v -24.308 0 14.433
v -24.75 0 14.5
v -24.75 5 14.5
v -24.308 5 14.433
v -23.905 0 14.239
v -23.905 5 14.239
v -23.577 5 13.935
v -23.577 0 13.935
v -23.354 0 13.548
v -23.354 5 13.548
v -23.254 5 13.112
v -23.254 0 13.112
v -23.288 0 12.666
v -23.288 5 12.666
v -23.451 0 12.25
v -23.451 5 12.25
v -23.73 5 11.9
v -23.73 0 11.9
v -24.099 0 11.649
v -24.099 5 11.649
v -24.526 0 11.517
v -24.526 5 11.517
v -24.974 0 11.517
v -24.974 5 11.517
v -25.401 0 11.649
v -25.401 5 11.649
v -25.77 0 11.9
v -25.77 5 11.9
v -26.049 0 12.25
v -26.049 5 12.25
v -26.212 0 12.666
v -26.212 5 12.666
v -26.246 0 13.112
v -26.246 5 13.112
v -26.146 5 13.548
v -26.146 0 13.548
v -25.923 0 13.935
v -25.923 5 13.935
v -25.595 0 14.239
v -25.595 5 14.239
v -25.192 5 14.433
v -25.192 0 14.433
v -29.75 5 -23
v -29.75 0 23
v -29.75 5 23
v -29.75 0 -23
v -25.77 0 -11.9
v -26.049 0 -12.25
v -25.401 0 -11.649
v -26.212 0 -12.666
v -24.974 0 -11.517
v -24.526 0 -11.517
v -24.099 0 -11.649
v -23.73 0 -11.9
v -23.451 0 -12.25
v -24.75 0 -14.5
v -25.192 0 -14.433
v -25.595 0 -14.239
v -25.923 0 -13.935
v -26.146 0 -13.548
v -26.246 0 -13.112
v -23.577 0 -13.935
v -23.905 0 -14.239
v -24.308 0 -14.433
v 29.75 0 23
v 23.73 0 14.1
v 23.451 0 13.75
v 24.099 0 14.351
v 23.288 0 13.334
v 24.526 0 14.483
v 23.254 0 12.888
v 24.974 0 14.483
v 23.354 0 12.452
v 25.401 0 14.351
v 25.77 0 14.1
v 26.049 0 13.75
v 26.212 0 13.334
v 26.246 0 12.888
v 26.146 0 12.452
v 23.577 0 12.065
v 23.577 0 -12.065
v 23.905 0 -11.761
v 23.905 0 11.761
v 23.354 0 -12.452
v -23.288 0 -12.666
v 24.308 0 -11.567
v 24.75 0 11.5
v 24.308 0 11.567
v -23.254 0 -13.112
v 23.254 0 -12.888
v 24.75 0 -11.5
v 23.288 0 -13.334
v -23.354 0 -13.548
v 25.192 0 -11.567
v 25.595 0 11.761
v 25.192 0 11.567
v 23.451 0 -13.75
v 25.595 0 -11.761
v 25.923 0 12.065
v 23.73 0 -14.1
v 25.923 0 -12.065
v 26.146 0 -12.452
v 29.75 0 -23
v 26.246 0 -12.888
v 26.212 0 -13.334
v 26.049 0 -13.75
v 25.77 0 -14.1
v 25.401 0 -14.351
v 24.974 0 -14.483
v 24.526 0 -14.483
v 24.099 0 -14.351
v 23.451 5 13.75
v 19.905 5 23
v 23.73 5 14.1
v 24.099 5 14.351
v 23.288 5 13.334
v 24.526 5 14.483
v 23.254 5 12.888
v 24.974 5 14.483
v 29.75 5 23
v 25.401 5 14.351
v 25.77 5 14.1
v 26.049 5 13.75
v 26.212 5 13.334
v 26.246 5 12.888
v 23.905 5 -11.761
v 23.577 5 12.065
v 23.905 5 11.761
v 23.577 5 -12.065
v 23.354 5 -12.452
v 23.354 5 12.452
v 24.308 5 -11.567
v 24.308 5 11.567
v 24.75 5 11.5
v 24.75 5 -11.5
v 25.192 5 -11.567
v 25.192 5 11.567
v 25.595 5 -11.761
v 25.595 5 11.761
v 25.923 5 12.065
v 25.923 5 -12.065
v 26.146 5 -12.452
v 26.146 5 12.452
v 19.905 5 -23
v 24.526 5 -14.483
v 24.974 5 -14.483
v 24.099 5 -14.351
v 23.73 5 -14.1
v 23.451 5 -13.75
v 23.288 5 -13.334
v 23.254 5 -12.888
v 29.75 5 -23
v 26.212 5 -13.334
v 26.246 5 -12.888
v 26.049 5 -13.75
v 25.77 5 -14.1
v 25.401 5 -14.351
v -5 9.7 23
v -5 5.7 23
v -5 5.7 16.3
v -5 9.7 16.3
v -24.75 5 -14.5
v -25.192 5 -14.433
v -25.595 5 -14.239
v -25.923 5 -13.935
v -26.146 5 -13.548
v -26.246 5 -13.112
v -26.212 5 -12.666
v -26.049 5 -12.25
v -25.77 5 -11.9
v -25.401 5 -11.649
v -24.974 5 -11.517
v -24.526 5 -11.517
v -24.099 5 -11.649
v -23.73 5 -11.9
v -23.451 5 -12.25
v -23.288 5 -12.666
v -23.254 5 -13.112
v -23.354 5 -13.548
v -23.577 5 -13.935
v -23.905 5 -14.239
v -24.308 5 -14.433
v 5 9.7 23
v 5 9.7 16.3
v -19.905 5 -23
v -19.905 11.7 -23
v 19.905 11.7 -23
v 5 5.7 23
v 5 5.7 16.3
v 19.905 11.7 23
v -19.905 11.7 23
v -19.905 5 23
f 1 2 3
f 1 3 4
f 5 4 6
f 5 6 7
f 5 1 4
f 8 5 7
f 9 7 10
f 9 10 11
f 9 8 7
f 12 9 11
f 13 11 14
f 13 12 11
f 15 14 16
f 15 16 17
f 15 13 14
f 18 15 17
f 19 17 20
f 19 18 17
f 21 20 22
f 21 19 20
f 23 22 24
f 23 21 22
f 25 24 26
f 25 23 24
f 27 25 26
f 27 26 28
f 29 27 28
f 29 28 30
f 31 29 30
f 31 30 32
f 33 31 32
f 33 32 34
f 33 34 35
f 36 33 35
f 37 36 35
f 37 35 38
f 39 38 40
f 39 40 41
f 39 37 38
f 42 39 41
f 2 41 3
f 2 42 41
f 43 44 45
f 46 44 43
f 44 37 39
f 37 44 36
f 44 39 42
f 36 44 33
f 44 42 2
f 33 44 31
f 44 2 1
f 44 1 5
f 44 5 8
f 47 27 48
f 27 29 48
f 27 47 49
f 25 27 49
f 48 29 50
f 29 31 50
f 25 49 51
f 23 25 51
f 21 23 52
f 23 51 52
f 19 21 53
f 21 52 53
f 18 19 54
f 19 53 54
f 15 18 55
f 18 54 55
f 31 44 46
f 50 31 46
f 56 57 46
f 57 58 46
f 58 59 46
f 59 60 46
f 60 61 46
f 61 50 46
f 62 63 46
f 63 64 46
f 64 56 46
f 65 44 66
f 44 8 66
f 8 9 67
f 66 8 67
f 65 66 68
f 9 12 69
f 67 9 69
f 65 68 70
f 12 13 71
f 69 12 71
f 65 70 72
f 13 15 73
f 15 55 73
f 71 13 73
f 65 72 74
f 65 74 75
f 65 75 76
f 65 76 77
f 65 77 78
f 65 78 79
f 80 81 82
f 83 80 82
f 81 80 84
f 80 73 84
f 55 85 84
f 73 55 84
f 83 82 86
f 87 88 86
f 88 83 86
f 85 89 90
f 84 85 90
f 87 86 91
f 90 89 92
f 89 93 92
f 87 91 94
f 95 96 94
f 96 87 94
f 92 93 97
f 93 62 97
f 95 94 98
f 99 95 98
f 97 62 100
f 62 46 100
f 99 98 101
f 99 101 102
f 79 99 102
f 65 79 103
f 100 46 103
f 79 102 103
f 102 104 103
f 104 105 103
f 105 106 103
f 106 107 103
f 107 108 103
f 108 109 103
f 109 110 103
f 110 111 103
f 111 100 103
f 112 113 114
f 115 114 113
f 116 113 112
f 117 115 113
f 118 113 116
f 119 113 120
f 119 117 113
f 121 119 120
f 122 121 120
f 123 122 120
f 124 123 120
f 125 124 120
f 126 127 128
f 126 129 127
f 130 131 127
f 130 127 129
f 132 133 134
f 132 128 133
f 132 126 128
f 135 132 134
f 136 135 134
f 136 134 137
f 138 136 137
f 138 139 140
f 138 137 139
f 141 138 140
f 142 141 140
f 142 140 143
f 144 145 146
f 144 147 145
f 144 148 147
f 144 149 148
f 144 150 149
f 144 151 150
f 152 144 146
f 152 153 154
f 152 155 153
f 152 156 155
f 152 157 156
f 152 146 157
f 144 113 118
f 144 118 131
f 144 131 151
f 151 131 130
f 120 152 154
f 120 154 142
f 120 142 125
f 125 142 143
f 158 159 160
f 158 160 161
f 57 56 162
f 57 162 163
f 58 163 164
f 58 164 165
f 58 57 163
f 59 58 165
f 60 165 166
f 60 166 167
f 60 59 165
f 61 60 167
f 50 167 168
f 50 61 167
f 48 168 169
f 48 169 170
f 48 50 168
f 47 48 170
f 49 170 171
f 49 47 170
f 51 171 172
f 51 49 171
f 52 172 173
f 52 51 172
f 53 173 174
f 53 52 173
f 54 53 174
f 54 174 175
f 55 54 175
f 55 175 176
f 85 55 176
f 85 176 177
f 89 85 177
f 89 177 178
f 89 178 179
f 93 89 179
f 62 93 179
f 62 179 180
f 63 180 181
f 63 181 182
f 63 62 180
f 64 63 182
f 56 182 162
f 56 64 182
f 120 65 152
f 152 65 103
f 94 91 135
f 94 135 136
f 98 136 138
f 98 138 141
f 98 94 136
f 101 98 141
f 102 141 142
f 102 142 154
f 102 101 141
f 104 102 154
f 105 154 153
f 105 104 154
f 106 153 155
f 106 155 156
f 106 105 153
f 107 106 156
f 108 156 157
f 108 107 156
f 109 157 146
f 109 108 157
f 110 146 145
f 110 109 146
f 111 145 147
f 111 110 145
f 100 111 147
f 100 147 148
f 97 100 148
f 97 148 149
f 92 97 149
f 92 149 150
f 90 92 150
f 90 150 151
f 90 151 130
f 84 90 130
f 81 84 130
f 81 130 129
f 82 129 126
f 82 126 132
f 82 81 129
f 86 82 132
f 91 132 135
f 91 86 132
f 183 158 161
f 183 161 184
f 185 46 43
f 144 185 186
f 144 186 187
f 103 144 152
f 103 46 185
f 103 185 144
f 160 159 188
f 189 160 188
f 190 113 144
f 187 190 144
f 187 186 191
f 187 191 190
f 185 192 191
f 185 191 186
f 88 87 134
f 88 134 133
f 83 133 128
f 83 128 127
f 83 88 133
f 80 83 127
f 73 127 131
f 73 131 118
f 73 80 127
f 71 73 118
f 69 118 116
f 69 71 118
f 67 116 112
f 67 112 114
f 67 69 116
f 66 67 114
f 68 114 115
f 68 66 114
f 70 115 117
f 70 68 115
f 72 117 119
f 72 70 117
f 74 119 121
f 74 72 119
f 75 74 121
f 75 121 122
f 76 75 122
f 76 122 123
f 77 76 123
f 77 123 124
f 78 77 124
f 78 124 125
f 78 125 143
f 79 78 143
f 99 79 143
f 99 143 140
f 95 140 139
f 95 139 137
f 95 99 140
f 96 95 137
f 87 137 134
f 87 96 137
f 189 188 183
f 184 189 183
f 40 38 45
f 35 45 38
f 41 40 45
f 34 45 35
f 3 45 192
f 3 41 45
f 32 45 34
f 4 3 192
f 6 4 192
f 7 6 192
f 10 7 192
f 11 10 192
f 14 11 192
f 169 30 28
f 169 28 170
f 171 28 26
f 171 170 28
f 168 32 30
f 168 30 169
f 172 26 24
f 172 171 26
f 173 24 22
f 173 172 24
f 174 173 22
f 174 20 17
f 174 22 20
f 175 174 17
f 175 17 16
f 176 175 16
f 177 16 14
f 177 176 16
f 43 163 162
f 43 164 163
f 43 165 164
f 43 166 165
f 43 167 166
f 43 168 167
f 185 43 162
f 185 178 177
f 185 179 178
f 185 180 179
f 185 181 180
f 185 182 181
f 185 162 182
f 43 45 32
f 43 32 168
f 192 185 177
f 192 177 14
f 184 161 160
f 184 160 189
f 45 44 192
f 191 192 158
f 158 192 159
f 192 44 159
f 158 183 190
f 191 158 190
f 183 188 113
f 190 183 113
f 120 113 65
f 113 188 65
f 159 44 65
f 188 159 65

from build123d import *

# Parameters (mm, degrees)
SKETCH_1_W          = 59.5
SKETCH_1_H          = 46
SKETCH_1_R          = 1.5
EXTRUDE_1_DEPTH     = 5
SKETCH_2_W          = 39.81
SKETCH_2_H          = 46
EXTRUDE_2_DEPTH     = 6.7
SKETCH_3_W          = 10
SKETCH_3_H          = 4
CUT_EXTRUDE_1_DEPTH = 6.7


with BuildPart() as part:
    # 草图1 → 凸台-拉伸1 (new body)
    with BuildSketch(Plane(origin=(0, 0, 0), x_dir=(1, 0, 0), z_dir=(0, 1, 0))):
        Rectangle(SKETCH_1_W, SKETCH_1_H)
        with Locations(Location((24.75, 13, 0), (0, 0, 270))):
            Circle(SKETCH_1_R, mode=Mode.SUBTRACT)
        with Locations(Location((24.75, -13, 0), (0, 0, 90))):
            Circle(SKETCH_1_R, mode=Mode.SUBTRACT)
        with Locations(Location((-24.75, -13, 0), (0, 0, 270))):
            Circle(SKETCH_1_R, mode=Mode.SUBTRACT)
        with Locations(Location((-24.75, 13, 0), (0, 0, 90))):
            Circle(SKETCH_1_R, mode=Mode.SUBTRACT)
    extrude(amount=EXTRUDE_1_DEPTH)

    # 草图2 → 凸台-拉伸2 (add)
    with BuildSketch(Plane(origin=(0, 5, 0), x_dir=(1, 0, 0), z_dir=(0, 1, 0))):
        Rectangle(SKETCH_2_W, SKETCH_2_H)
    extrude(amount=EXTRUDE_2_DEPTH)

    # 草图3 → 切除-拉伸1 (cut)
    with BuildSketch(Plane.XY.offset(23)):
        with Locations((0, 7.7)):
            Rectangle(SKETCH_3_W, SKETCH_3_H)
    extrude(amount=-CUT_EXTRUDE_1_DEPTH, mode=Mode.SUBTRACT)


solid = part.part
